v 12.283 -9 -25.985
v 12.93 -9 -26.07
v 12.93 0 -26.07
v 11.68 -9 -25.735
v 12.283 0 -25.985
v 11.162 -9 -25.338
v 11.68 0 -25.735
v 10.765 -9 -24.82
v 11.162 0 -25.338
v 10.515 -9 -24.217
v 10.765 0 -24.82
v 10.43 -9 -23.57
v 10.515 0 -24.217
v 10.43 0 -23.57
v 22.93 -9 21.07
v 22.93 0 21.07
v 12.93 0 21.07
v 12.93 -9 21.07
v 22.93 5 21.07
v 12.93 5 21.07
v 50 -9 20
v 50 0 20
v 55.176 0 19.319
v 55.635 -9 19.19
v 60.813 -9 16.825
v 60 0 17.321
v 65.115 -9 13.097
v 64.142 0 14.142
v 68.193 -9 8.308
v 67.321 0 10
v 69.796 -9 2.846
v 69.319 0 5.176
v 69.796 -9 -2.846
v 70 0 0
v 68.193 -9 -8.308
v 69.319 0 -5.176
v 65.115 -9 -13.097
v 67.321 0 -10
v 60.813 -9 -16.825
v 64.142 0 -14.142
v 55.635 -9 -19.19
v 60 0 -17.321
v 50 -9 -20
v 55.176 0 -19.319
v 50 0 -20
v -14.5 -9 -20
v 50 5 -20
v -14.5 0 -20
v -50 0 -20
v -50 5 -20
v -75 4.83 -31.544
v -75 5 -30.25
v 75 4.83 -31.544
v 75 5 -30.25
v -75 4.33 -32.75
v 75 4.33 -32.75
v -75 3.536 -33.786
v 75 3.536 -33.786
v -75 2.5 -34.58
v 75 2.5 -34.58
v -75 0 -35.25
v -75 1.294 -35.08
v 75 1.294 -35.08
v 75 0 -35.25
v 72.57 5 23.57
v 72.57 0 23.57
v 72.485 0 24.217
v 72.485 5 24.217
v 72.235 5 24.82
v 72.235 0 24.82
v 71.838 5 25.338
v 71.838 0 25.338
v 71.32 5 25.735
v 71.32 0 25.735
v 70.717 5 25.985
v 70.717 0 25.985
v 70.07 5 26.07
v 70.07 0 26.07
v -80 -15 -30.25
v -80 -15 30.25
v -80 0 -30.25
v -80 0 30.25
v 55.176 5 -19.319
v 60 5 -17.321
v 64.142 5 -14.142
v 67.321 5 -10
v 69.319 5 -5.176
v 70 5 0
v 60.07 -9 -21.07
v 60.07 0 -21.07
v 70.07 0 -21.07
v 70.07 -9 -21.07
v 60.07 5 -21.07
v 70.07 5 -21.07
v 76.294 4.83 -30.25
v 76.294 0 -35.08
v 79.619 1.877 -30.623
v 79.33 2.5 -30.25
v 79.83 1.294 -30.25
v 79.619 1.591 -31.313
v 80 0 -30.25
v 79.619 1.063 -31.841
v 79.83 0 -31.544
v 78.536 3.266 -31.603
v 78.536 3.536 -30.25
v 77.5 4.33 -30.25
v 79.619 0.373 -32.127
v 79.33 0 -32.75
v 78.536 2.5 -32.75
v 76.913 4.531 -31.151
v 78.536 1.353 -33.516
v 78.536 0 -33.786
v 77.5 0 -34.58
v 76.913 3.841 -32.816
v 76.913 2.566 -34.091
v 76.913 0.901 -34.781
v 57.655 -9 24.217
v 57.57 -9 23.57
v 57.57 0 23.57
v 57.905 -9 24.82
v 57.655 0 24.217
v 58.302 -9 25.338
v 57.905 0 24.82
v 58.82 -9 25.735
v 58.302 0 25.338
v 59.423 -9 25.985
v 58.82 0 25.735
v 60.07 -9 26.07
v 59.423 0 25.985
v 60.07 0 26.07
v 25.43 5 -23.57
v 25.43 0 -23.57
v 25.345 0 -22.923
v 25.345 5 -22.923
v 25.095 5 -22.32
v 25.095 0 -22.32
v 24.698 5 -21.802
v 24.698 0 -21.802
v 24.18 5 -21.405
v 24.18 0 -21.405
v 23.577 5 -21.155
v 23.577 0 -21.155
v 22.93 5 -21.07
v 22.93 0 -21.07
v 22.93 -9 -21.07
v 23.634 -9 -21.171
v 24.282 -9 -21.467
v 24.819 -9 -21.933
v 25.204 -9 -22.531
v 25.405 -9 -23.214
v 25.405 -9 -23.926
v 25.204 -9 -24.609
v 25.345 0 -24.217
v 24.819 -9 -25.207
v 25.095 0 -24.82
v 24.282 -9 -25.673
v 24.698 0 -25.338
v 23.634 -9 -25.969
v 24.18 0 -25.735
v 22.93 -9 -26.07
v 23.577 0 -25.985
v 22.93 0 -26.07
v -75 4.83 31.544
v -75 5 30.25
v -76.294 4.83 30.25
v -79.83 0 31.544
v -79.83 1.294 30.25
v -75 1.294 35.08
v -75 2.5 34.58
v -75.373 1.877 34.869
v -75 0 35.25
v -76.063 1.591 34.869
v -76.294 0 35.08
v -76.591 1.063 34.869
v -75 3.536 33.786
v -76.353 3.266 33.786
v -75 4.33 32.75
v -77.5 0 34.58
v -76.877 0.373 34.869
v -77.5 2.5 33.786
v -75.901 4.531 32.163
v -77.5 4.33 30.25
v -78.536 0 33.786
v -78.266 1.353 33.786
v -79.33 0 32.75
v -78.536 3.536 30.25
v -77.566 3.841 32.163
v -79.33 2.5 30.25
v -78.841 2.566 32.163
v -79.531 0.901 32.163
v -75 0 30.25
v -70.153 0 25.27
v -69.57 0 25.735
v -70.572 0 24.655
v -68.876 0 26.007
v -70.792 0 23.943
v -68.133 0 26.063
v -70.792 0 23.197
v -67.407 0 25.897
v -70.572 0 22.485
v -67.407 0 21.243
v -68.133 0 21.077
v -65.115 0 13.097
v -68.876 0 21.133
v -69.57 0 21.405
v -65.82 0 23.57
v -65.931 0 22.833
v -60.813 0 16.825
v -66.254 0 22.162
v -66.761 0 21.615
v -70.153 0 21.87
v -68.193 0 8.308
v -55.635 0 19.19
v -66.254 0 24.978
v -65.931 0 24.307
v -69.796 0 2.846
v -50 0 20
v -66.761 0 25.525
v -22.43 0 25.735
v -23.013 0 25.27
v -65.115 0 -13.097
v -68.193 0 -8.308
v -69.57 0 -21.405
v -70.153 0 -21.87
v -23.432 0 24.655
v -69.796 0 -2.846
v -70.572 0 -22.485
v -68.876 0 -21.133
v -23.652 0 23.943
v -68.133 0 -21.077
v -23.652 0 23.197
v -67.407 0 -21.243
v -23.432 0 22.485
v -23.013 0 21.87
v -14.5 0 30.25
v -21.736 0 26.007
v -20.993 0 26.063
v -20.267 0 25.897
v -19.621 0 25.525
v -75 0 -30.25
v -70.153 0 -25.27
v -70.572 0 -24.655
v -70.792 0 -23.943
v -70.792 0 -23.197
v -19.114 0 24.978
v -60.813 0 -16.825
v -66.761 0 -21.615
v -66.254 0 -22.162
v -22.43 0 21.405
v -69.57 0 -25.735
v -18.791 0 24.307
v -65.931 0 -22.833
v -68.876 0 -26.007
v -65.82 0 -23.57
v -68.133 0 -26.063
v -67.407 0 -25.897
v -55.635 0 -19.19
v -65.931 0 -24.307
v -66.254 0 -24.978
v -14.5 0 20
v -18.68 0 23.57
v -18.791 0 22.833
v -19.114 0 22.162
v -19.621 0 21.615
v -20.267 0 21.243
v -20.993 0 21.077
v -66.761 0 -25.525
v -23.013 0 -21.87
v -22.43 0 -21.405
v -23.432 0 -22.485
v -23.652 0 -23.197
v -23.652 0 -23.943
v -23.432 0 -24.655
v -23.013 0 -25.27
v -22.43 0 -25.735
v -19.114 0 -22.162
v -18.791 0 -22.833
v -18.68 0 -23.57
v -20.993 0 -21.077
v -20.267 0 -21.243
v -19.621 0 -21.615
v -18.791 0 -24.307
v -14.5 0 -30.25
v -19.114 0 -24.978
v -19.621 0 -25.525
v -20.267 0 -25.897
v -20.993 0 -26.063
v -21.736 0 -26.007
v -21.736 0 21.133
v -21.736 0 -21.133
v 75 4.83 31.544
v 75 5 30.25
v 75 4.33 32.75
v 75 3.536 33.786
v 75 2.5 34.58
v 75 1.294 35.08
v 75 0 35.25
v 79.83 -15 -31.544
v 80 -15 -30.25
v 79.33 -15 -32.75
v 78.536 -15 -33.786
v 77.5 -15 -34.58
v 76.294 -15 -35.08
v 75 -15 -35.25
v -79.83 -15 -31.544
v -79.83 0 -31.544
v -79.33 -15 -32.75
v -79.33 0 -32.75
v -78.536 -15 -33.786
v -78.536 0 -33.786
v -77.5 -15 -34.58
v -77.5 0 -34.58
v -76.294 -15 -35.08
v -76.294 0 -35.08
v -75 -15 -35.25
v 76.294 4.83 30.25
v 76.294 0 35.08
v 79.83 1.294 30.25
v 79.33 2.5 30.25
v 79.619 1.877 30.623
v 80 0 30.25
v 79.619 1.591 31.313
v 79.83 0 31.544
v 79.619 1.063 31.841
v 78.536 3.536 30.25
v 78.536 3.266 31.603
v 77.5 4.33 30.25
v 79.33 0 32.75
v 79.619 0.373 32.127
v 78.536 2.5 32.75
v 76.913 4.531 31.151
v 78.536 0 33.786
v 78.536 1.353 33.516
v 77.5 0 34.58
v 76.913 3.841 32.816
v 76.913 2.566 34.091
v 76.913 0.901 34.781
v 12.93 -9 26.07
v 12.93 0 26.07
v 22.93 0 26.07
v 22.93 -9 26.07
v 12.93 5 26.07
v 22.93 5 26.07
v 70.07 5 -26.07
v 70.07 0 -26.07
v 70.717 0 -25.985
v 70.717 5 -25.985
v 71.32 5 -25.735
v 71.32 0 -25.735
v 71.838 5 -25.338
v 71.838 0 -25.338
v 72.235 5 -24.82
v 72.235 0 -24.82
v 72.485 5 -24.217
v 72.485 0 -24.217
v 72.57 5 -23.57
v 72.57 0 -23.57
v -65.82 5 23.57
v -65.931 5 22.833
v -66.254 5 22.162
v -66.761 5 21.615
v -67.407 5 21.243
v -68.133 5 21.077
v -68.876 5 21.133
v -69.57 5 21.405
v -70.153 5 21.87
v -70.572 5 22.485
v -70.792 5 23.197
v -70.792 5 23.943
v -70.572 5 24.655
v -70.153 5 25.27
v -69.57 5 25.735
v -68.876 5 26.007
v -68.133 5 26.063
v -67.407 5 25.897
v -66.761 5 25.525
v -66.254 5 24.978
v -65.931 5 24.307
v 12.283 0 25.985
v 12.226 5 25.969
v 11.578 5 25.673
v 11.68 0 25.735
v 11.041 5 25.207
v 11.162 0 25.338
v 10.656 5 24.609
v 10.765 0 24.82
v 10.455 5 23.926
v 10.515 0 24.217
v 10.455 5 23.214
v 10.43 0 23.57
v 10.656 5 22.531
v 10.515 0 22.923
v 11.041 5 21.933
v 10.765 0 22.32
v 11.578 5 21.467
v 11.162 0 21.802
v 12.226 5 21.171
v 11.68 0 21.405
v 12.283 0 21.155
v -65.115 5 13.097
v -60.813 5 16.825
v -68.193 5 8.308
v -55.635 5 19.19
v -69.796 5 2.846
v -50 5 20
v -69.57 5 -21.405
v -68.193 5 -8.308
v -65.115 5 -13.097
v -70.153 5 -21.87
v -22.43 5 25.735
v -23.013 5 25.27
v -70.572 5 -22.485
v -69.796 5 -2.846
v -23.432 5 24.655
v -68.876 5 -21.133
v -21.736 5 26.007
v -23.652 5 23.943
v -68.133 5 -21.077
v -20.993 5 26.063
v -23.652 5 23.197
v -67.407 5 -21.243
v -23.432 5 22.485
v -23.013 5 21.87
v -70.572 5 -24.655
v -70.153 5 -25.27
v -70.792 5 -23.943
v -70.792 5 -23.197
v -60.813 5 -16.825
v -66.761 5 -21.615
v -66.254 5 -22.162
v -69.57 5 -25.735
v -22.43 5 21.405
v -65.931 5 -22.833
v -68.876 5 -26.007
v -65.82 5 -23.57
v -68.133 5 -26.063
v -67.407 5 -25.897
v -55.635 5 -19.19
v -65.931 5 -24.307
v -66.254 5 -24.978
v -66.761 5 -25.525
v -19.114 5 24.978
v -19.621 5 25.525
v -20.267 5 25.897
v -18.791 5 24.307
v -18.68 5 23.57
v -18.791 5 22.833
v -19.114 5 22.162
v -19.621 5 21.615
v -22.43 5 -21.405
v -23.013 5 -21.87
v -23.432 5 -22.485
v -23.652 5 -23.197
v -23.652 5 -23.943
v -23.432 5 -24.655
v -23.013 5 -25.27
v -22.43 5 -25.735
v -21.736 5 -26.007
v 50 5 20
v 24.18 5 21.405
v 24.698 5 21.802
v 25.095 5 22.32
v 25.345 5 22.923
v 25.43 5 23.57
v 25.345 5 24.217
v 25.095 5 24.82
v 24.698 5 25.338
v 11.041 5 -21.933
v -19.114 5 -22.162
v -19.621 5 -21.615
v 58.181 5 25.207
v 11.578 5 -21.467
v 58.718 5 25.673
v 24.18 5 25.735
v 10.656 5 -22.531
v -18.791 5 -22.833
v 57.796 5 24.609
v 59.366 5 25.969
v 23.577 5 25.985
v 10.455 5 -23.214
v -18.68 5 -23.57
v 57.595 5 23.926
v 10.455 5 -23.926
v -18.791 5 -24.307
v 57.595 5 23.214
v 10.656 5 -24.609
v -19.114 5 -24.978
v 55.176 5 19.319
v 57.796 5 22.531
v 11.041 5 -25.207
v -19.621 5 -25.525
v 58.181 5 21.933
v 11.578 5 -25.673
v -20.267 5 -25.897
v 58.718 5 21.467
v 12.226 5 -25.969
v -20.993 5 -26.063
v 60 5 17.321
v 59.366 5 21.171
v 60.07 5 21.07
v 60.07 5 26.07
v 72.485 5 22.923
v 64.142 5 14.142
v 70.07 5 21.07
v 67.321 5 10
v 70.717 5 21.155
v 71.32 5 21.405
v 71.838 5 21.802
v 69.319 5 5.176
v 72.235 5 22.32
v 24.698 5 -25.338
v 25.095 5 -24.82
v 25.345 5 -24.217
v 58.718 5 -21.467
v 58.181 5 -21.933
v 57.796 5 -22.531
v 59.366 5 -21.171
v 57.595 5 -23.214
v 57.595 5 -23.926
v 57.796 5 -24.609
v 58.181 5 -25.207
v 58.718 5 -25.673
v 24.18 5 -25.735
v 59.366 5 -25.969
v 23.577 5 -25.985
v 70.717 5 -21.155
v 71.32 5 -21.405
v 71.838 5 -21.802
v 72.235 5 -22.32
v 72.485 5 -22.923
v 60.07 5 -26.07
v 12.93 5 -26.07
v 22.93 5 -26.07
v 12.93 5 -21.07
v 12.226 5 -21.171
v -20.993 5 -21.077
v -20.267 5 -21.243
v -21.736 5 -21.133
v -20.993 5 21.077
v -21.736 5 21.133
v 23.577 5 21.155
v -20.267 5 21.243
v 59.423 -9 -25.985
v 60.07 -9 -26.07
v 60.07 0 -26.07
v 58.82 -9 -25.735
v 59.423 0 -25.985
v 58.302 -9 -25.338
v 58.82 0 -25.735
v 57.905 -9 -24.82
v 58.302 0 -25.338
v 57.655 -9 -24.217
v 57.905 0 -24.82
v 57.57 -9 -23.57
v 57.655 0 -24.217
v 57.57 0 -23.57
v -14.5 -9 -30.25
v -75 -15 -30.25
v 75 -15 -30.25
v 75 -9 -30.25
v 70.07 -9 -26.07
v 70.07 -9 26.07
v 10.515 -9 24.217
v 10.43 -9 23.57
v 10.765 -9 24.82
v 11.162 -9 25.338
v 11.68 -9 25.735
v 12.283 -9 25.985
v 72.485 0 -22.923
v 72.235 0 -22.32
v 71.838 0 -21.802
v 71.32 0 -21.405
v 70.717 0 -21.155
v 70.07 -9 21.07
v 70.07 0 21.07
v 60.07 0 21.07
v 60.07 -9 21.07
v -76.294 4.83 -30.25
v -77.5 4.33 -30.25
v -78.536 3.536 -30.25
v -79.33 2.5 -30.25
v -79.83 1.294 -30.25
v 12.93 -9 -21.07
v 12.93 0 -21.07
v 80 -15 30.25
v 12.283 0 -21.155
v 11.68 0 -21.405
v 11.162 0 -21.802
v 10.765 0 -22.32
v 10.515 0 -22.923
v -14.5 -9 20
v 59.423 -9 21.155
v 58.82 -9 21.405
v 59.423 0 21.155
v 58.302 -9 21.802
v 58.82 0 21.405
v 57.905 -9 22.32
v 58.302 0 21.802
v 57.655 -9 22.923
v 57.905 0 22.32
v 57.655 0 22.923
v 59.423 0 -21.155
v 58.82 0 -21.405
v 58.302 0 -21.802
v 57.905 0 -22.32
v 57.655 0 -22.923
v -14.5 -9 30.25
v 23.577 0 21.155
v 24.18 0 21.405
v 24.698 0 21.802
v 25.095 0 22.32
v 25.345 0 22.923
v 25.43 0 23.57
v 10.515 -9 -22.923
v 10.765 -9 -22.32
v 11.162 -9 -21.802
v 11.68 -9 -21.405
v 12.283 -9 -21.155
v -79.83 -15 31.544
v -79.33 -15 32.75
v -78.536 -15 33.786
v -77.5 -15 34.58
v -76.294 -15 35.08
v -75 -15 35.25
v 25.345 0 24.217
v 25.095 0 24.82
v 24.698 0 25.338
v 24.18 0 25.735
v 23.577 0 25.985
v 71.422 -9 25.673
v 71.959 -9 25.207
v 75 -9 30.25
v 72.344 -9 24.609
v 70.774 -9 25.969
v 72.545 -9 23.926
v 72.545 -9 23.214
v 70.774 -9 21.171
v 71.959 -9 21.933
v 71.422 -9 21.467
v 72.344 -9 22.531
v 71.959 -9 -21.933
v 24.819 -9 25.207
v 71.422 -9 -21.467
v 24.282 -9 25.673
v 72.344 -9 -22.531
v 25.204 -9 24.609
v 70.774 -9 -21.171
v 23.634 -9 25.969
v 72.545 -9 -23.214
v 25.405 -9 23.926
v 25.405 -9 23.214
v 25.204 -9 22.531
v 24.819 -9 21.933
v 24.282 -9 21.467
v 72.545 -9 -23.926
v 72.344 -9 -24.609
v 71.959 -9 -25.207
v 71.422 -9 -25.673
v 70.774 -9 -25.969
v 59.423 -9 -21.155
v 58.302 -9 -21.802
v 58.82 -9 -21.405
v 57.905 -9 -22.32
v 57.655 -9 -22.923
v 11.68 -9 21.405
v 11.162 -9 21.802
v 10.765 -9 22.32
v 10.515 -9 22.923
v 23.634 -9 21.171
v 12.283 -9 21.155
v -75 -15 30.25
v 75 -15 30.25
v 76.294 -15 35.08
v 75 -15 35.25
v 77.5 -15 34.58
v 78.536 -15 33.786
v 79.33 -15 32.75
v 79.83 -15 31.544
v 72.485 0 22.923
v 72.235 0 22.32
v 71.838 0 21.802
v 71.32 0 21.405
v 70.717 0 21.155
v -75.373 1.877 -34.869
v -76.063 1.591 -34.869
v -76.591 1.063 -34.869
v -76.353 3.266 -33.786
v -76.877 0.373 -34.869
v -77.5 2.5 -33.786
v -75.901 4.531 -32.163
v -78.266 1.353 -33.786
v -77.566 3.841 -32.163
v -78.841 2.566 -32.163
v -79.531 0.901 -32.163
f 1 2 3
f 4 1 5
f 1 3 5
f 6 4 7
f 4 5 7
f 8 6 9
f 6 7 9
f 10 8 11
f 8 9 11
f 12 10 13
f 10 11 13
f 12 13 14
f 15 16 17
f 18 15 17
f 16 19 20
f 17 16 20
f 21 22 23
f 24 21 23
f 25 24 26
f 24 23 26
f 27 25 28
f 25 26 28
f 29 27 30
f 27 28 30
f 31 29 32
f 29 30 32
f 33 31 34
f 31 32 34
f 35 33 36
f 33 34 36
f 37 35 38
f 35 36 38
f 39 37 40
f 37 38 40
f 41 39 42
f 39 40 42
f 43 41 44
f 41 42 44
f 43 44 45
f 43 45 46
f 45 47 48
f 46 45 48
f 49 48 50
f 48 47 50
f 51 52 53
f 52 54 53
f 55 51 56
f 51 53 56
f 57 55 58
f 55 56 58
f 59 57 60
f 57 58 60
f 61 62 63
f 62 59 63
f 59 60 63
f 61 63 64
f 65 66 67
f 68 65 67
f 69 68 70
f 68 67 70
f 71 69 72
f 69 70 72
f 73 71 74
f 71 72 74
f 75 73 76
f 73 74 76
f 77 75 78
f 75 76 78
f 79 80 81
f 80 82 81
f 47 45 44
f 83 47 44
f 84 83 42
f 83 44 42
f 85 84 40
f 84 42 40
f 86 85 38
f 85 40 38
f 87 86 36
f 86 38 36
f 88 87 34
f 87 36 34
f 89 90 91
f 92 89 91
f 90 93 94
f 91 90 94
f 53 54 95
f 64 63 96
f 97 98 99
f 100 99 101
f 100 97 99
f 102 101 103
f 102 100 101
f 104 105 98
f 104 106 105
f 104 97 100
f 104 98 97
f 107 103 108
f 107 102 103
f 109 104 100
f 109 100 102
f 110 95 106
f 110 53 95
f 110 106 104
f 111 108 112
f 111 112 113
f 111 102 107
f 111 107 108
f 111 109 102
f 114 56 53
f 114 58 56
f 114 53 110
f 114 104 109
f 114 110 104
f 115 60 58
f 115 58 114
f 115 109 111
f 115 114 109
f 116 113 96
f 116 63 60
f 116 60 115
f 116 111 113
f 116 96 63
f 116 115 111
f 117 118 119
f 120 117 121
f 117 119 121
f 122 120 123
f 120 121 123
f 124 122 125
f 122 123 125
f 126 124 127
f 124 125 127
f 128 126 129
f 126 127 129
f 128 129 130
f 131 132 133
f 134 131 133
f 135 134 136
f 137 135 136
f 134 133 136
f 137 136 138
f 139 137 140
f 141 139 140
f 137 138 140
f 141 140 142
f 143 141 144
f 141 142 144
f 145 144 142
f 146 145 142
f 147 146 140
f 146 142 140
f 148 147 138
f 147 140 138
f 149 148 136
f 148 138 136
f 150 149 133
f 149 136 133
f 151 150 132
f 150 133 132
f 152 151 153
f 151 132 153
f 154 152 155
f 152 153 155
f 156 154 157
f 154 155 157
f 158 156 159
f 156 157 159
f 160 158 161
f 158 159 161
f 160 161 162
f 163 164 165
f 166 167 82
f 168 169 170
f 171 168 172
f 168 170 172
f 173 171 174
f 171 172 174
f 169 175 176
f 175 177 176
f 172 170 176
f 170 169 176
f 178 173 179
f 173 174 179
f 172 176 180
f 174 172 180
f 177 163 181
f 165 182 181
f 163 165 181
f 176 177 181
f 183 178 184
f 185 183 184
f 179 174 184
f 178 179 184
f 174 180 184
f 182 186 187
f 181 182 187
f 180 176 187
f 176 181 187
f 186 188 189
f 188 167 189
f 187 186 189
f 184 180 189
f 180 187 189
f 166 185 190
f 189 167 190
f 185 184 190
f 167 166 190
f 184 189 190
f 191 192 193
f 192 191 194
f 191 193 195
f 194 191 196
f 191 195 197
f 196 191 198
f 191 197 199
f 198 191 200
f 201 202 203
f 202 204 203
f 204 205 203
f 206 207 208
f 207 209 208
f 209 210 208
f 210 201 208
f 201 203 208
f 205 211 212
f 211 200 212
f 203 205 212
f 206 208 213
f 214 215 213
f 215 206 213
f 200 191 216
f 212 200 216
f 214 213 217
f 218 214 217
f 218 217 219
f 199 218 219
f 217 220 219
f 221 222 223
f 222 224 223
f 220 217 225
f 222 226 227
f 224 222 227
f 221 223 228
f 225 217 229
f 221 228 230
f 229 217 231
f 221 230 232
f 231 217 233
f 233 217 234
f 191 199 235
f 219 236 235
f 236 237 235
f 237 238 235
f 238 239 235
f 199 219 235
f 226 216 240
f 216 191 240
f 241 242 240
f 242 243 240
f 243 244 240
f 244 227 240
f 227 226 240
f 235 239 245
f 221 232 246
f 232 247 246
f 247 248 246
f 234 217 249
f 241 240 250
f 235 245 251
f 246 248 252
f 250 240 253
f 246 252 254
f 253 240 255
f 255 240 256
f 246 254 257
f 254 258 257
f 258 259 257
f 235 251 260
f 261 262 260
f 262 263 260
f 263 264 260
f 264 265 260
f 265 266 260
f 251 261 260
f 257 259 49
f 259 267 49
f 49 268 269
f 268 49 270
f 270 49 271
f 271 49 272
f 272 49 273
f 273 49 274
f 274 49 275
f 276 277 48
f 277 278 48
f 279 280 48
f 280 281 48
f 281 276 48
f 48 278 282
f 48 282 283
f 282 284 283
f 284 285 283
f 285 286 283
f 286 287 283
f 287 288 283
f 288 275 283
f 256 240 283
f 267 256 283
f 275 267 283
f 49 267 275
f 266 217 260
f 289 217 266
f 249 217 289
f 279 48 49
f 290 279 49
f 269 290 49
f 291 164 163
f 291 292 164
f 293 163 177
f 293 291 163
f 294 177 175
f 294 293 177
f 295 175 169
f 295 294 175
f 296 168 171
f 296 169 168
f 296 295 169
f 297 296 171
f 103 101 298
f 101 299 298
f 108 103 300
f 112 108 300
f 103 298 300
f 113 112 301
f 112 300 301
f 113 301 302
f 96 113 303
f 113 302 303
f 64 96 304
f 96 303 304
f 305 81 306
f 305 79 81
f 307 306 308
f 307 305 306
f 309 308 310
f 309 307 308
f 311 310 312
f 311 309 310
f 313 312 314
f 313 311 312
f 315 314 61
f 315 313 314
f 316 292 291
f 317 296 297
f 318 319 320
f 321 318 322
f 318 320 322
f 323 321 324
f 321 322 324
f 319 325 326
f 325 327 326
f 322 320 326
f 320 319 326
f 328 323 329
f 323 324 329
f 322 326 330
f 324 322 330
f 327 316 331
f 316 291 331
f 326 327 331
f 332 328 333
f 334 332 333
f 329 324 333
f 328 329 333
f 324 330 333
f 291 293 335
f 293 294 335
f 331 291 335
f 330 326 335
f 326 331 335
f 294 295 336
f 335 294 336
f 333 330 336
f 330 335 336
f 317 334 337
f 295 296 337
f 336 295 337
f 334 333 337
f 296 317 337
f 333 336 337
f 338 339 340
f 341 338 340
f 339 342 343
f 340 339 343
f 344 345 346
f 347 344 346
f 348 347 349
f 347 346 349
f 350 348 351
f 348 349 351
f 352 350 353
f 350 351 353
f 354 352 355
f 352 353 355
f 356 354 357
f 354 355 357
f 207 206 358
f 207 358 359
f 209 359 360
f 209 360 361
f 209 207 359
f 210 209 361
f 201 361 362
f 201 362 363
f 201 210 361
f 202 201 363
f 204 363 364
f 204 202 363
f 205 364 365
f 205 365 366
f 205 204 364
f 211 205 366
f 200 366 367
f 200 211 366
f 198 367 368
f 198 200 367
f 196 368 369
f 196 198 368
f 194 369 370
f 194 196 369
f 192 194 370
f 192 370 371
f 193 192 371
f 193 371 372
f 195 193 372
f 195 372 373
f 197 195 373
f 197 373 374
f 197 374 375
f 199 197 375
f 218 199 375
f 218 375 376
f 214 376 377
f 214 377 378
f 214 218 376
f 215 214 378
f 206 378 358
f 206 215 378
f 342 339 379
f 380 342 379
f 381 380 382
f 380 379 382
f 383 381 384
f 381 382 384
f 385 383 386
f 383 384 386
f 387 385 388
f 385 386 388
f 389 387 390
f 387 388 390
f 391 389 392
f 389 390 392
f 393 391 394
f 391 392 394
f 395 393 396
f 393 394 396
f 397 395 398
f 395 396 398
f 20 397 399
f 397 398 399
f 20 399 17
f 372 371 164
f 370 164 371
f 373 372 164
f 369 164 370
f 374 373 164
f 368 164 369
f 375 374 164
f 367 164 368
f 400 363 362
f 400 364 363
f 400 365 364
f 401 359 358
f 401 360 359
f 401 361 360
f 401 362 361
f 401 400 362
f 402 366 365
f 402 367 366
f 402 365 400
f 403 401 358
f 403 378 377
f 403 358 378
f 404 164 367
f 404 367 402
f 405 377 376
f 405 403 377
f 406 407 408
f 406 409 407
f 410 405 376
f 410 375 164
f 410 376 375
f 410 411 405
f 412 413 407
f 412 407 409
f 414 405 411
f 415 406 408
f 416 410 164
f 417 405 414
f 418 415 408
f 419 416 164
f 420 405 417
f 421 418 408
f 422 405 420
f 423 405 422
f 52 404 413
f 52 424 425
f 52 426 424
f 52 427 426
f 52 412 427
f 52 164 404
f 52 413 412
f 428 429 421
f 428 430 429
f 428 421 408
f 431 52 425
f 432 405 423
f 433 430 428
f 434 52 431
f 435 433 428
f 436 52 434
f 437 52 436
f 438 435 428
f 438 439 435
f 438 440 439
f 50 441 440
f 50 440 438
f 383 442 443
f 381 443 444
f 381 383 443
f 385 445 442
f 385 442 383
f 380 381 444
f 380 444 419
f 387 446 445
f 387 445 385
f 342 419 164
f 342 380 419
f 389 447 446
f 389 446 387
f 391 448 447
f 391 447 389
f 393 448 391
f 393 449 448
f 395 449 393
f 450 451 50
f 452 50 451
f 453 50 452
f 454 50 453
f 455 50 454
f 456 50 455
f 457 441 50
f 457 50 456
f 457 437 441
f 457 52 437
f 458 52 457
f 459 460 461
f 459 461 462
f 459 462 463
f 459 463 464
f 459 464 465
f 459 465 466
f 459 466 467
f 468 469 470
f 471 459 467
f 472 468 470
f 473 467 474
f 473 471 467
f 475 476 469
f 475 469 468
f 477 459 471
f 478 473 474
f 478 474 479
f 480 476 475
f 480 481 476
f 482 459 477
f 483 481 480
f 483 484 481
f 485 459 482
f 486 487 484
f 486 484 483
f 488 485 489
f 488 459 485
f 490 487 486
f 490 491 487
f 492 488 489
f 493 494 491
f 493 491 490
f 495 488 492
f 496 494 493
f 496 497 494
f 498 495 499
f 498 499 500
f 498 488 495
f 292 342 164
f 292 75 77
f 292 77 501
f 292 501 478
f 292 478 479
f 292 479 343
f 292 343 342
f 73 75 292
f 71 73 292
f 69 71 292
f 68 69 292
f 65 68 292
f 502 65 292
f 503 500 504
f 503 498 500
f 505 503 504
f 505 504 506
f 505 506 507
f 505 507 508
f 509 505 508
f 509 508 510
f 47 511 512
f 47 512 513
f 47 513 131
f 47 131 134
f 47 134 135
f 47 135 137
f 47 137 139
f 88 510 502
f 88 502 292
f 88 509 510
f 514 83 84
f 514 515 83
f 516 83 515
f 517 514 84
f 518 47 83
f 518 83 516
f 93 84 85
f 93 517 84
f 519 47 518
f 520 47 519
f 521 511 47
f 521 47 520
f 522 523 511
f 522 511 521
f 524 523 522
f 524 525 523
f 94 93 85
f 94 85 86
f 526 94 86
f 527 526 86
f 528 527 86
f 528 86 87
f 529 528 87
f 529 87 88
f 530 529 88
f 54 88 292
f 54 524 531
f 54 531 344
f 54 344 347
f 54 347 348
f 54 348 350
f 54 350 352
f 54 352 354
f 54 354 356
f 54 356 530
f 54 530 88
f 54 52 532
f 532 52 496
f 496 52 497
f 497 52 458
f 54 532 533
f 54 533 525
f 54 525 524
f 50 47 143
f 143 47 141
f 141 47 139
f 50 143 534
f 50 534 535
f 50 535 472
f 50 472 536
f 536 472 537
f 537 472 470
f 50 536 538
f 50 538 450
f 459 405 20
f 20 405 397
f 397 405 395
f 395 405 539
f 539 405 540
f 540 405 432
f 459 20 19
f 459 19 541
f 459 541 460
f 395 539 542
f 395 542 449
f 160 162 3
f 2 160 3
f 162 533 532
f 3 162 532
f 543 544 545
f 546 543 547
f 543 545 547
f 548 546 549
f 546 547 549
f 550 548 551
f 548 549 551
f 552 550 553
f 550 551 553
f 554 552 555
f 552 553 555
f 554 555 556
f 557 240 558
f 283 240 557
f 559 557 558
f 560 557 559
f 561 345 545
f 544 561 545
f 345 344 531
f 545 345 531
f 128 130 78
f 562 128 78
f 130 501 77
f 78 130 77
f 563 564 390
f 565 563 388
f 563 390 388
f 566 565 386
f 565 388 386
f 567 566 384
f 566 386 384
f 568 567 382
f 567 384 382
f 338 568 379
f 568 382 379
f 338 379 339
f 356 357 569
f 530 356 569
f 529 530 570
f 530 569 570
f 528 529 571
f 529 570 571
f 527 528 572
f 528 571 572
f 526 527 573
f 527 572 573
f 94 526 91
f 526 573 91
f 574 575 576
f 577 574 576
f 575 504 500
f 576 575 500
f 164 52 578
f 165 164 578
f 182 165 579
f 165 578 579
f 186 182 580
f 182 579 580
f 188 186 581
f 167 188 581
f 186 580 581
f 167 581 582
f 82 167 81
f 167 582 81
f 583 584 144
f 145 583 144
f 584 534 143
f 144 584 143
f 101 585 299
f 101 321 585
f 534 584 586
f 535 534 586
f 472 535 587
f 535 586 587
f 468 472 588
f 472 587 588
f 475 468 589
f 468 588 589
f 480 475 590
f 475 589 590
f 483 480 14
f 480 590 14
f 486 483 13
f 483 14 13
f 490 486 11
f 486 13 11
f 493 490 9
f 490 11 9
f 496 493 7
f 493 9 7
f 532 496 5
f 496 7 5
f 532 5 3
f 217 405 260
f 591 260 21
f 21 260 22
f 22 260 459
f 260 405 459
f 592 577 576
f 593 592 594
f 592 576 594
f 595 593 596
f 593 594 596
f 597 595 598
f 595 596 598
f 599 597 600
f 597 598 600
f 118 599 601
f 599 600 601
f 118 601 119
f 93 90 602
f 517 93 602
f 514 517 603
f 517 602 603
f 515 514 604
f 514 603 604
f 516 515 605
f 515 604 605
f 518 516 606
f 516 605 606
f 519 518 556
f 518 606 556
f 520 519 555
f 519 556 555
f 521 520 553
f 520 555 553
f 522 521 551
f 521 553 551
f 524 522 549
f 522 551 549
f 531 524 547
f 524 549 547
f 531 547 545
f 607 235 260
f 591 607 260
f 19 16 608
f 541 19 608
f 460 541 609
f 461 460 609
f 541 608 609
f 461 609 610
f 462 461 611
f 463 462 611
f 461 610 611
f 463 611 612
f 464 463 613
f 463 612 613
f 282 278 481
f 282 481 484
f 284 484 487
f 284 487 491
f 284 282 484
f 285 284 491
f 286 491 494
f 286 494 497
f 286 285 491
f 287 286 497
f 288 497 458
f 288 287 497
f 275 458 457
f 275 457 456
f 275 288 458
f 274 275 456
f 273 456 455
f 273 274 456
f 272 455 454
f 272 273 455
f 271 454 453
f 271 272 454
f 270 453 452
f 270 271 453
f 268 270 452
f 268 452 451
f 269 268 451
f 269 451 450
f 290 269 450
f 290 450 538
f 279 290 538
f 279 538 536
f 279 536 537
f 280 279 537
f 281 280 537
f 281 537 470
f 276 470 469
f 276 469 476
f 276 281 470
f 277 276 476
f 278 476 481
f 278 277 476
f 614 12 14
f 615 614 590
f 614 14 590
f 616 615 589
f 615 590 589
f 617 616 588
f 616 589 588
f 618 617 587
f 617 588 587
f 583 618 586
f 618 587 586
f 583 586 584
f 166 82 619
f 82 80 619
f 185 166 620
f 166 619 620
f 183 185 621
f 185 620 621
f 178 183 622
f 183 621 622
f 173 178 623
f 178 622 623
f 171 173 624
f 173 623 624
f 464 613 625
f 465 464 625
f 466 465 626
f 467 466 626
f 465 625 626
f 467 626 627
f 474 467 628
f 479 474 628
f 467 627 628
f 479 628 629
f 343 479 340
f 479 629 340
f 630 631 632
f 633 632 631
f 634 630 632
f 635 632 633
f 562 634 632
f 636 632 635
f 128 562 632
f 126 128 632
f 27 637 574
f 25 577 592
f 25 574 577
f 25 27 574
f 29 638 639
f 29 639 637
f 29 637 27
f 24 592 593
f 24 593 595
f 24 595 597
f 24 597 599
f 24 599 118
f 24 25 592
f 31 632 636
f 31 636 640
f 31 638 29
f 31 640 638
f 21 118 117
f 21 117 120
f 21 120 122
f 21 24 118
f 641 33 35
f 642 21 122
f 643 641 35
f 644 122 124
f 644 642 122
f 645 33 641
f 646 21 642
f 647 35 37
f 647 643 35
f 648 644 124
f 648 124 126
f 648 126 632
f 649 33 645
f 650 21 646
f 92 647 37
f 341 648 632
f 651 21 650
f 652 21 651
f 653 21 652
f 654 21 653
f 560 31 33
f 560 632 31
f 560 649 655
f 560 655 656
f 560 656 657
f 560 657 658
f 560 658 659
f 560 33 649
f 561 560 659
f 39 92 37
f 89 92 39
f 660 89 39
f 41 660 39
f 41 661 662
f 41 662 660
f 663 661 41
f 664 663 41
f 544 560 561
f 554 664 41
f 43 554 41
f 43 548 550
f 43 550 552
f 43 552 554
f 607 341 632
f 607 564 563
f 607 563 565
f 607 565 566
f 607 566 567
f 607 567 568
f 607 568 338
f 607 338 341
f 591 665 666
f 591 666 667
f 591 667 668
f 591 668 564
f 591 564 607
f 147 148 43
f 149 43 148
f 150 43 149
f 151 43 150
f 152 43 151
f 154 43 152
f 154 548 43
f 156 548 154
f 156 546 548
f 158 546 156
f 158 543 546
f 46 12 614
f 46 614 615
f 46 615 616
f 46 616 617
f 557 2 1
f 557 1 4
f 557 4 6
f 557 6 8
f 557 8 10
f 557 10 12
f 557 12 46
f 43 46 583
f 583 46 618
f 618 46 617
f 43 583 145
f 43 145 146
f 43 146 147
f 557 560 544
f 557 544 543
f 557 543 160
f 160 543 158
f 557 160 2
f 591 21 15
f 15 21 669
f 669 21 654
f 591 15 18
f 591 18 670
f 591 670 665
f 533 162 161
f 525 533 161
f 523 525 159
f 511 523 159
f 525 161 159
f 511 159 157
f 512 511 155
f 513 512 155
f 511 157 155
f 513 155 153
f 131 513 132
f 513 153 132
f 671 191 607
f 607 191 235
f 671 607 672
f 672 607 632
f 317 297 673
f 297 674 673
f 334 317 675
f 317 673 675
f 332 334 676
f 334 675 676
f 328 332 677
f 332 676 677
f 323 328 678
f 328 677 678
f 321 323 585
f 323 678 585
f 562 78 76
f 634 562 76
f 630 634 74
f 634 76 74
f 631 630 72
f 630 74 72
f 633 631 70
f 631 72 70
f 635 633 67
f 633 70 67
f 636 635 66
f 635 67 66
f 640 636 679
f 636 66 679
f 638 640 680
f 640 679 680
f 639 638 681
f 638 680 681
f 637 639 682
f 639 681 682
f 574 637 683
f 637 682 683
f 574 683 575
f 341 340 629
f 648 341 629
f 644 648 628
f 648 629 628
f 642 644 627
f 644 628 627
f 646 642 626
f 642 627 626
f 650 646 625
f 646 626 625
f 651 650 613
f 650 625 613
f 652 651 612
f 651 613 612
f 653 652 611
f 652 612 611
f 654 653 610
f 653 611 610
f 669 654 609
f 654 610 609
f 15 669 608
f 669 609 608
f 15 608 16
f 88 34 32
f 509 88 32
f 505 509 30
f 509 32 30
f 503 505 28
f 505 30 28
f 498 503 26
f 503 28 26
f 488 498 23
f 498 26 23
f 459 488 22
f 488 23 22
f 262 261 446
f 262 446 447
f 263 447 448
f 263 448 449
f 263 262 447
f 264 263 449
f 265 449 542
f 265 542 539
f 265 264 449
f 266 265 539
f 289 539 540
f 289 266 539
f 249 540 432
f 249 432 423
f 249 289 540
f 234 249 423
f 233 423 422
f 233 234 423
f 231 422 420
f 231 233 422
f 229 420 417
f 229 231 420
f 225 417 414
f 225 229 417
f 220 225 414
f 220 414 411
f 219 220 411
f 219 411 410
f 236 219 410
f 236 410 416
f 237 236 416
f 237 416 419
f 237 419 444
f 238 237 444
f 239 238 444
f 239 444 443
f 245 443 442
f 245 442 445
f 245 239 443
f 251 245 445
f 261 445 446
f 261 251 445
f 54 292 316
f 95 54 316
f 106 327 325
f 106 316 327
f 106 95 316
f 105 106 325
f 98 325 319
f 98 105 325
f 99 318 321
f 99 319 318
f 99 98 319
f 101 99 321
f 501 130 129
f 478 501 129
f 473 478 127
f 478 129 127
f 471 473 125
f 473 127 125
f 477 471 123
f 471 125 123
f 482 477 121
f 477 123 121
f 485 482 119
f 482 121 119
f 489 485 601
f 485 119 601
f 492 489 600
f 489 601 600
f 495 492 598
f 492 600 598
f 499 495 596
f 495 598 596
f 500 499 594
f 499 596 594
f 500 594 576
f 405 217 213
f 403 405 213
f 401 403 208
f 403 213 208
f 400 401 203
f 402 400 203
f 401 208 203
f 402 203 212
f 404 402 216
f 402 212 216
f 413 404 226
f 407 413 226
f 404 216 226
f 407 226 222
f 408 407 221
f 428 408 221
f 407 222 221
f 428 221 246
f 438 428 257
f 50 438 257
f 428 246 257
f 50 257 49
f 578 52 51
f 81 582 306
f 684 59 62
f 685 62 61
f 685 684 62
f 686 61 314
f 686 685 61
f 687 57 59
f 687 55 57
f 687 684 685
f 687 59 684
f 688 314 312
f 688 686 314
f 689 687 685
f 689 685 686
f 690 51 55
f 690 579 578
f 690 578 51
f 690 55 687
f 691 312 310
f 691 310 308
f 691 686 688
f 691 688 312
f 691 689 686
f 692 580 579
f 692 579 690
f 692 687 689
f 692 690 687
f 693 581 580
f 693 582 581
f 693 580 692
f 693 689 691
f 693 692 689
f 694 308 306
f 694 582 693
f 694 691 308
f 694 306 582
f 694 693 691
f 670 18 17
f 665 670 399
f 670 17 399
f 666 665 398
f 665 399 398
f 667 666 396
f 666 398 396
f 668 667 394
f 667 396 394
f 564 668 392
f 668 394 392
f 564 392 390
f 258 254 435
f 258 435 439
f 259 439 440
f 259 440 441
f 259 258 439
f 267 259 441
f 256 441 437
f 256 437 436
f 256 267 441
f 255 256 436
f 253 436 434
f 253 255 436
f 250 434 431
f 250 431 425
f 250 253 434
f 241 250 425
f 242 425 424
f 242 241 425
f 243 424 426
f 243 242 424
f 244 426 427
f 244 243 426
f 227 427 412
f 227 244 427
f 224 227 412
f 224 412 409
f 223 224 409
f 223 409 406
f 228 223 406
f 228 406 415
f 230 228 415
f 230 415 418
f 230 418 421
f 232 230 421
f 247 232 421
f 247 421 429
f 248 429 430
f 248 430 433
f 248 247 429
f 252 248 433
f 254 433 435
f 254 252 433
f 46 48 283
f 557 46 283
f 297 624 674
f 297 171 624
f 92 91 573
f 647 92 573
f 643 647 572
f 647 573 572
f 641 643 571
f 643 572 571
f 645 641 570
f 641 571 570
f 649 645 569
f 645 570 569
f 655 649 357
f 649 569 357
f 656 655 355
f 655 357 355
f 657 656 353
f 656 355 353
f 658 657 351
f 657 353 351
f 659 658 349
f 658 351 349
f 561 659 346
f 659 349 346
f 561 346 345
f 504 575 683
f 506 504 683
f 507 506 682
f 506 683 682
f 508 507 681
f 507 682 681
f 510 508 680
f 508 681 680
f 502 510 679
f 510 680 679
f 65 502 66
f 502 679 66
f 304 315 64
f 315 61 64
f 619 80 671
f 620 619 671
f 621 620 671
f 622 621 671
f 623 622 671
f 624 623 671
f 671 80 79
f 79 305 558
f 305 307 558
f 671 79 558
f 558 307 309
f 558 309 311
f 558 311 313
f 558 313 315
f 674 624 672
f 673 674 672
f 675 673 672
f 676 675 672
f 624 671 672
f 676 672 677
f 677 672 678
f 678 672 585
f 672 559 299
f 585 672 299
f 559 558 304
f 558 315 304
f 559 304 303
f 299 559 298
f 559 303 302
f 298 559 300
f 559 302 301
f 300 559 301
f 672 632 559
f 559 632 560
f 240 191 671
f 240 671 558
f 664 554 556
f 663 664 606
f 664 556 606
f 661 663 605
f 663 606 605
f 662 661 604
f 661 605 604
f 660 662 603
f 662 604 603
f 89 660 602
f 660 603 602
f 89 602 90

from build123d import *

# Parameters (mm, degrees)
SKETCH2_R           = 2.5
SKETCH2_W           = 67
SKETCH2_H           = 1.75
BOSS_EXTRUDE1_DEPTH = 5
SKETCH4_W           = 160
SKETCH4_H           = 70.5
SKETCH4_W_2         = 150
SKETCH4_H_2         = 60.5
BOSS_EXTRUDE2_DEPTH = 20
SKETCH5_W           = 22.5
SKETCH5_H           = 10.25
BOSS_EXTRUDE3_DEPTH = 9
FILLET2_R           = 5


with BuildPart() as part:
    # Sketch2 → Boss-Extrude1 (new body)
    with BuildSketch(Plane(origin=(0, 0, 0), x_dir=(1, 0, 0), z_dir=(0, 1, 0))):
        with BuildLine():
            Line((-14.5, 30.25), (-75, 30.25))
            Line((-75, 30.25), (-75, -30.25))
            Line((-75, -30.25), (-14.5, -30.25))
            Line((-14.5, -30.25), (-14.5, -20))
            Line((-14.5, -20), (-50, -20))
            ThreePointArc((-50, -20), (-70, 0), (-50, 20))
            Line((-50, 20), (-14.5, 20))
            Line((-14.5, 20), (-14.5, 30.25))
        make_face()
        with Locations((-68.32, -23.57)):
            Circle(SKETCH2_R, mode=Mode.SUBTRACT)
        with Locations((-21.18, -23.57)):
            Circle(SKETCH2_R, mode=Mode.SUBTRACT)
        with Locations((-68.32, 23.57)):
            Circle(SKETCH2_R, mode=Mode.SUBTRACT)
        with Locations((-21.18, 23.57)):
            Circle(SKETCH2_R, mode=Mode.SUBTRACT)
        with BuildLine():
            Line((8, 30.25), (-14.5, 30.25))
            Line((-14.5, 30.25), (-14.5, 20))
            Line((-14.5, 20), (50, 20))
            ThreePointArc((50, 20), (64.142135624, 14.142135624), (70, 0))
            ThreePointArc((70, 0), (64.142135624, -14.142135624), (50, -20))
            Line((50, -20), (-14.5, -20))
            Line((-14.5, -20), (-14.5, -30.25))
            Line((-14.5, -30.25), (8, -30.25))
            Line((8, -30.25), (8, -28.5))
            Line((8, -28.5), (75, -28.5))
            Line((75, -28.5), (75, 28.5))
            Line((75, 28.5), (8, 28.5))
            Line((8, 28.5), (8, 30.25))
        make_face()
        with BuildLine():
            ThreePointArc((25.43, -23.57), (24.697766953, -25.337766953), (22.93, -26.07))
            Line((22.93, -26.07), (12.93, -26.07))
            ThreePointArc((12.93, -26.07), (10.43, -23.57), (12.93, -21.07))
            Line((12.93, -21.07), (22.93, -21.07))
            ThreePointArc((22.93, -21.07), (24.697766953, -21.802233047), (25.43, -23.57))
        make_face(mode=Mode.SUBTRACT)
        with BuildLine():
            ThreePointArc((72.57, -23.57), (71.837766953, -25.337766953), (70.07, -26.07))
            Line((70.07, -26.07), (60.07, -26.07))
            ThreePointArc((60.07, -26.07), (57.57, -23.57), (60.07, -21.07))
            Line((60.07, -21.07), (70.07, -21.07))
            ThreePointArc((70.07, -21.07), (71.837766953, -21.802233047), (72.57, -23.57))
        make_face(mode=Mode.SUBTRACT)
        with BuildLine():
            ThreePointArc((25.43, 23.57), (24.697766953, 21.802233047), (22.93, 21.07))
            Line((22.93, 21.07), (12.93, 21.07))
            ThreePointArc((12.93, 21.07), (10.43, 23.57), (12.93, 26.07))
            Line((12.93, 26.07), (22.93, 26.07))
            ThreePointArc((22.93, 26.07), (24.697766953, 25.337766953), (25.43, 23.57))
        make_face(mode=Mode.SUBTRACT)
        with BuildLine():
            ThreePointArc((60.07, 21.07), (57.57, 23.57), (60.07, 26.07))
            Line((60.07, 26.07), (70.07, 26.07))
            ThreePointArc((70.07, 26.07), (71.837766953, 25.337766953), (72.57, 23.57))
            ThreePointArc((72.57, 23.57), (71.837766953, 21.802233047), (70.07, 21.07))
            Line((70.07, 21.07), (60.07, 21.07))
        make_face(mode=Mode.SUBTRACT)
        with Locations((41.5, -29.375)):
            Rectangle(SKETCH2_W, SKETCH2_H)
        with Locations((41.5, 29.375)):
            Rectangle(SKETCH2_W, SKETCH2_H)
    extrude(amount=BOSS_EXTRUDE1_DEPTH)

    # Sketch4 → Boss-Extrude2 (add)
    with BuildSketch(Plane(origin=(0, 5, 0), x_dir=(1, 0, 0), z_dir=(0, 1, 0))):
        Rectangle(SKETCH4_W, SKETCH4_H)
        Rectangle(SKETCH4_W_2, SKETCH4_H_2, mode=Mode.SUBTRACT)
    extrude(amount=-BOSS_EXTRUDE2_DEPTH)

    # Sketch5 → Boss-Extrude3 (add)
    with BuildSketch(Plane(origin=(0, 0, 0), x_dir=(-1, 0, 0), z_dir=(0, -1, 0))):
        with BuildLine():
            Line((-8, 20), (-8, 30.25))
            Line((-8, 30.25), (-75, 30.25))
            Line((-75, 30.25), (-75, -30.25))
            Line((-75, -30.25), (-8, -30.25))
            Line((-8, -30.25), (-8, -20))
            Line((-8, -20), (-50, -20))
            ThreePointArc((-50, -20), (-70, 0), (-50, 20))
            Line((-50, 20), (-8, 20))
        make_face()
        with BuildLine():
            ThreePointArc((-57.57, -23.57), (-58.302233047, -25.337766953), (-60.07, -26.07))
            Line((-60.07, -26.07), (-70.07, -26.07))
            ThreePointArc((-70.07, -26.07), (-72.57, -23.57), (-70.07, -21.07))
            Line((-70.07, -21.07), (-60.07, -21.07))
            ThreePointArc((-60.07, -21.07), (-58.302233047, -21.802233047), (-57.57, -23.57))
        make_face(mode=Mode.SUBTRACT)
        with BuildLine():
            ThreePointArc((-10.43, -23.57), (-11.162233047, -25.337766953), (-12.93, -26.07))
            Line((-12.93, -26.07), (-22.93, -26.07))
            ThreePointArc((-22.93, -26.07), (-25.43, -23.57), (-22.93, -21.07))
            Line((-22.93, -21.07), (-12.93, -21.07))
            ThreePointArc((-12.93, -21.07), (-11.162233047, -21.802233047), (-10.43, -23.57))
        make_face(mode=Mode.SUBTRACT)
        with BuildLine():
            ThreePointArc((-70.07, 21.07), (-72.57, 23.57), (-70.07, 26.07))
            Line((-70.07, 26.07), (-60.07, 26.07))
            ThreePointArc((-60.07, 26.07), (-58.302233047, 25.337766953), (-57.57, 23.57))
            ThreePointArc((-57.57, 23.57), (-58.302233047, 21.802233047), (-60.07, 21.07))
            Line((-60.07, 21.07), (-70.07, 21.07))
        make_face(mode=Mode.SUBTRACT)
        with BuildLine():
            ThreePointArc((-22.93, 21.07), (-25.43, 23.57), (-22.93, 26.07))
            Line((-22.93, 26.07), (-12.93, 26.07))
            ThreePointArc((-12.93, 26.07), (-11.162233047, 25.337766953), (-10.43, 23.57))
            ThreePointArc((-10.43, 23.57), (-11.162233047, 21.802233047), (-12.93, 21.07))
            Line((-12.93, 21.07), (-22.93, 21.07))
        make_face(mode=Mode.SUBTRACT)
        with Locations((3.25, 25.125)):
            Rectangle(SKETCH5_W, SKETCH5_H)
        with Locations((3.25, -25.125)):
            Rectangle(SKETCH5_W, SKETCH5_H)
    extrude(amount=BOSS_EXTRUDE3_DEPTH)

    # Fillet2
    fillet2_edges = [part.edges().sort_by_distance(p)[0] for p in [
        (-80, 5, 0),
        (0, 5, 35.25),
        (0, 5, -35.25),
        (-80, -5, -35.25),
        (80, 5, 0),
        (80, -5, -35.25),
        (80, -5, 35.25),
        (-80, -5, 35.25),
    ]]
    fillet(fillet2_edges, radius=FILLET2_R)


solid = part.part
